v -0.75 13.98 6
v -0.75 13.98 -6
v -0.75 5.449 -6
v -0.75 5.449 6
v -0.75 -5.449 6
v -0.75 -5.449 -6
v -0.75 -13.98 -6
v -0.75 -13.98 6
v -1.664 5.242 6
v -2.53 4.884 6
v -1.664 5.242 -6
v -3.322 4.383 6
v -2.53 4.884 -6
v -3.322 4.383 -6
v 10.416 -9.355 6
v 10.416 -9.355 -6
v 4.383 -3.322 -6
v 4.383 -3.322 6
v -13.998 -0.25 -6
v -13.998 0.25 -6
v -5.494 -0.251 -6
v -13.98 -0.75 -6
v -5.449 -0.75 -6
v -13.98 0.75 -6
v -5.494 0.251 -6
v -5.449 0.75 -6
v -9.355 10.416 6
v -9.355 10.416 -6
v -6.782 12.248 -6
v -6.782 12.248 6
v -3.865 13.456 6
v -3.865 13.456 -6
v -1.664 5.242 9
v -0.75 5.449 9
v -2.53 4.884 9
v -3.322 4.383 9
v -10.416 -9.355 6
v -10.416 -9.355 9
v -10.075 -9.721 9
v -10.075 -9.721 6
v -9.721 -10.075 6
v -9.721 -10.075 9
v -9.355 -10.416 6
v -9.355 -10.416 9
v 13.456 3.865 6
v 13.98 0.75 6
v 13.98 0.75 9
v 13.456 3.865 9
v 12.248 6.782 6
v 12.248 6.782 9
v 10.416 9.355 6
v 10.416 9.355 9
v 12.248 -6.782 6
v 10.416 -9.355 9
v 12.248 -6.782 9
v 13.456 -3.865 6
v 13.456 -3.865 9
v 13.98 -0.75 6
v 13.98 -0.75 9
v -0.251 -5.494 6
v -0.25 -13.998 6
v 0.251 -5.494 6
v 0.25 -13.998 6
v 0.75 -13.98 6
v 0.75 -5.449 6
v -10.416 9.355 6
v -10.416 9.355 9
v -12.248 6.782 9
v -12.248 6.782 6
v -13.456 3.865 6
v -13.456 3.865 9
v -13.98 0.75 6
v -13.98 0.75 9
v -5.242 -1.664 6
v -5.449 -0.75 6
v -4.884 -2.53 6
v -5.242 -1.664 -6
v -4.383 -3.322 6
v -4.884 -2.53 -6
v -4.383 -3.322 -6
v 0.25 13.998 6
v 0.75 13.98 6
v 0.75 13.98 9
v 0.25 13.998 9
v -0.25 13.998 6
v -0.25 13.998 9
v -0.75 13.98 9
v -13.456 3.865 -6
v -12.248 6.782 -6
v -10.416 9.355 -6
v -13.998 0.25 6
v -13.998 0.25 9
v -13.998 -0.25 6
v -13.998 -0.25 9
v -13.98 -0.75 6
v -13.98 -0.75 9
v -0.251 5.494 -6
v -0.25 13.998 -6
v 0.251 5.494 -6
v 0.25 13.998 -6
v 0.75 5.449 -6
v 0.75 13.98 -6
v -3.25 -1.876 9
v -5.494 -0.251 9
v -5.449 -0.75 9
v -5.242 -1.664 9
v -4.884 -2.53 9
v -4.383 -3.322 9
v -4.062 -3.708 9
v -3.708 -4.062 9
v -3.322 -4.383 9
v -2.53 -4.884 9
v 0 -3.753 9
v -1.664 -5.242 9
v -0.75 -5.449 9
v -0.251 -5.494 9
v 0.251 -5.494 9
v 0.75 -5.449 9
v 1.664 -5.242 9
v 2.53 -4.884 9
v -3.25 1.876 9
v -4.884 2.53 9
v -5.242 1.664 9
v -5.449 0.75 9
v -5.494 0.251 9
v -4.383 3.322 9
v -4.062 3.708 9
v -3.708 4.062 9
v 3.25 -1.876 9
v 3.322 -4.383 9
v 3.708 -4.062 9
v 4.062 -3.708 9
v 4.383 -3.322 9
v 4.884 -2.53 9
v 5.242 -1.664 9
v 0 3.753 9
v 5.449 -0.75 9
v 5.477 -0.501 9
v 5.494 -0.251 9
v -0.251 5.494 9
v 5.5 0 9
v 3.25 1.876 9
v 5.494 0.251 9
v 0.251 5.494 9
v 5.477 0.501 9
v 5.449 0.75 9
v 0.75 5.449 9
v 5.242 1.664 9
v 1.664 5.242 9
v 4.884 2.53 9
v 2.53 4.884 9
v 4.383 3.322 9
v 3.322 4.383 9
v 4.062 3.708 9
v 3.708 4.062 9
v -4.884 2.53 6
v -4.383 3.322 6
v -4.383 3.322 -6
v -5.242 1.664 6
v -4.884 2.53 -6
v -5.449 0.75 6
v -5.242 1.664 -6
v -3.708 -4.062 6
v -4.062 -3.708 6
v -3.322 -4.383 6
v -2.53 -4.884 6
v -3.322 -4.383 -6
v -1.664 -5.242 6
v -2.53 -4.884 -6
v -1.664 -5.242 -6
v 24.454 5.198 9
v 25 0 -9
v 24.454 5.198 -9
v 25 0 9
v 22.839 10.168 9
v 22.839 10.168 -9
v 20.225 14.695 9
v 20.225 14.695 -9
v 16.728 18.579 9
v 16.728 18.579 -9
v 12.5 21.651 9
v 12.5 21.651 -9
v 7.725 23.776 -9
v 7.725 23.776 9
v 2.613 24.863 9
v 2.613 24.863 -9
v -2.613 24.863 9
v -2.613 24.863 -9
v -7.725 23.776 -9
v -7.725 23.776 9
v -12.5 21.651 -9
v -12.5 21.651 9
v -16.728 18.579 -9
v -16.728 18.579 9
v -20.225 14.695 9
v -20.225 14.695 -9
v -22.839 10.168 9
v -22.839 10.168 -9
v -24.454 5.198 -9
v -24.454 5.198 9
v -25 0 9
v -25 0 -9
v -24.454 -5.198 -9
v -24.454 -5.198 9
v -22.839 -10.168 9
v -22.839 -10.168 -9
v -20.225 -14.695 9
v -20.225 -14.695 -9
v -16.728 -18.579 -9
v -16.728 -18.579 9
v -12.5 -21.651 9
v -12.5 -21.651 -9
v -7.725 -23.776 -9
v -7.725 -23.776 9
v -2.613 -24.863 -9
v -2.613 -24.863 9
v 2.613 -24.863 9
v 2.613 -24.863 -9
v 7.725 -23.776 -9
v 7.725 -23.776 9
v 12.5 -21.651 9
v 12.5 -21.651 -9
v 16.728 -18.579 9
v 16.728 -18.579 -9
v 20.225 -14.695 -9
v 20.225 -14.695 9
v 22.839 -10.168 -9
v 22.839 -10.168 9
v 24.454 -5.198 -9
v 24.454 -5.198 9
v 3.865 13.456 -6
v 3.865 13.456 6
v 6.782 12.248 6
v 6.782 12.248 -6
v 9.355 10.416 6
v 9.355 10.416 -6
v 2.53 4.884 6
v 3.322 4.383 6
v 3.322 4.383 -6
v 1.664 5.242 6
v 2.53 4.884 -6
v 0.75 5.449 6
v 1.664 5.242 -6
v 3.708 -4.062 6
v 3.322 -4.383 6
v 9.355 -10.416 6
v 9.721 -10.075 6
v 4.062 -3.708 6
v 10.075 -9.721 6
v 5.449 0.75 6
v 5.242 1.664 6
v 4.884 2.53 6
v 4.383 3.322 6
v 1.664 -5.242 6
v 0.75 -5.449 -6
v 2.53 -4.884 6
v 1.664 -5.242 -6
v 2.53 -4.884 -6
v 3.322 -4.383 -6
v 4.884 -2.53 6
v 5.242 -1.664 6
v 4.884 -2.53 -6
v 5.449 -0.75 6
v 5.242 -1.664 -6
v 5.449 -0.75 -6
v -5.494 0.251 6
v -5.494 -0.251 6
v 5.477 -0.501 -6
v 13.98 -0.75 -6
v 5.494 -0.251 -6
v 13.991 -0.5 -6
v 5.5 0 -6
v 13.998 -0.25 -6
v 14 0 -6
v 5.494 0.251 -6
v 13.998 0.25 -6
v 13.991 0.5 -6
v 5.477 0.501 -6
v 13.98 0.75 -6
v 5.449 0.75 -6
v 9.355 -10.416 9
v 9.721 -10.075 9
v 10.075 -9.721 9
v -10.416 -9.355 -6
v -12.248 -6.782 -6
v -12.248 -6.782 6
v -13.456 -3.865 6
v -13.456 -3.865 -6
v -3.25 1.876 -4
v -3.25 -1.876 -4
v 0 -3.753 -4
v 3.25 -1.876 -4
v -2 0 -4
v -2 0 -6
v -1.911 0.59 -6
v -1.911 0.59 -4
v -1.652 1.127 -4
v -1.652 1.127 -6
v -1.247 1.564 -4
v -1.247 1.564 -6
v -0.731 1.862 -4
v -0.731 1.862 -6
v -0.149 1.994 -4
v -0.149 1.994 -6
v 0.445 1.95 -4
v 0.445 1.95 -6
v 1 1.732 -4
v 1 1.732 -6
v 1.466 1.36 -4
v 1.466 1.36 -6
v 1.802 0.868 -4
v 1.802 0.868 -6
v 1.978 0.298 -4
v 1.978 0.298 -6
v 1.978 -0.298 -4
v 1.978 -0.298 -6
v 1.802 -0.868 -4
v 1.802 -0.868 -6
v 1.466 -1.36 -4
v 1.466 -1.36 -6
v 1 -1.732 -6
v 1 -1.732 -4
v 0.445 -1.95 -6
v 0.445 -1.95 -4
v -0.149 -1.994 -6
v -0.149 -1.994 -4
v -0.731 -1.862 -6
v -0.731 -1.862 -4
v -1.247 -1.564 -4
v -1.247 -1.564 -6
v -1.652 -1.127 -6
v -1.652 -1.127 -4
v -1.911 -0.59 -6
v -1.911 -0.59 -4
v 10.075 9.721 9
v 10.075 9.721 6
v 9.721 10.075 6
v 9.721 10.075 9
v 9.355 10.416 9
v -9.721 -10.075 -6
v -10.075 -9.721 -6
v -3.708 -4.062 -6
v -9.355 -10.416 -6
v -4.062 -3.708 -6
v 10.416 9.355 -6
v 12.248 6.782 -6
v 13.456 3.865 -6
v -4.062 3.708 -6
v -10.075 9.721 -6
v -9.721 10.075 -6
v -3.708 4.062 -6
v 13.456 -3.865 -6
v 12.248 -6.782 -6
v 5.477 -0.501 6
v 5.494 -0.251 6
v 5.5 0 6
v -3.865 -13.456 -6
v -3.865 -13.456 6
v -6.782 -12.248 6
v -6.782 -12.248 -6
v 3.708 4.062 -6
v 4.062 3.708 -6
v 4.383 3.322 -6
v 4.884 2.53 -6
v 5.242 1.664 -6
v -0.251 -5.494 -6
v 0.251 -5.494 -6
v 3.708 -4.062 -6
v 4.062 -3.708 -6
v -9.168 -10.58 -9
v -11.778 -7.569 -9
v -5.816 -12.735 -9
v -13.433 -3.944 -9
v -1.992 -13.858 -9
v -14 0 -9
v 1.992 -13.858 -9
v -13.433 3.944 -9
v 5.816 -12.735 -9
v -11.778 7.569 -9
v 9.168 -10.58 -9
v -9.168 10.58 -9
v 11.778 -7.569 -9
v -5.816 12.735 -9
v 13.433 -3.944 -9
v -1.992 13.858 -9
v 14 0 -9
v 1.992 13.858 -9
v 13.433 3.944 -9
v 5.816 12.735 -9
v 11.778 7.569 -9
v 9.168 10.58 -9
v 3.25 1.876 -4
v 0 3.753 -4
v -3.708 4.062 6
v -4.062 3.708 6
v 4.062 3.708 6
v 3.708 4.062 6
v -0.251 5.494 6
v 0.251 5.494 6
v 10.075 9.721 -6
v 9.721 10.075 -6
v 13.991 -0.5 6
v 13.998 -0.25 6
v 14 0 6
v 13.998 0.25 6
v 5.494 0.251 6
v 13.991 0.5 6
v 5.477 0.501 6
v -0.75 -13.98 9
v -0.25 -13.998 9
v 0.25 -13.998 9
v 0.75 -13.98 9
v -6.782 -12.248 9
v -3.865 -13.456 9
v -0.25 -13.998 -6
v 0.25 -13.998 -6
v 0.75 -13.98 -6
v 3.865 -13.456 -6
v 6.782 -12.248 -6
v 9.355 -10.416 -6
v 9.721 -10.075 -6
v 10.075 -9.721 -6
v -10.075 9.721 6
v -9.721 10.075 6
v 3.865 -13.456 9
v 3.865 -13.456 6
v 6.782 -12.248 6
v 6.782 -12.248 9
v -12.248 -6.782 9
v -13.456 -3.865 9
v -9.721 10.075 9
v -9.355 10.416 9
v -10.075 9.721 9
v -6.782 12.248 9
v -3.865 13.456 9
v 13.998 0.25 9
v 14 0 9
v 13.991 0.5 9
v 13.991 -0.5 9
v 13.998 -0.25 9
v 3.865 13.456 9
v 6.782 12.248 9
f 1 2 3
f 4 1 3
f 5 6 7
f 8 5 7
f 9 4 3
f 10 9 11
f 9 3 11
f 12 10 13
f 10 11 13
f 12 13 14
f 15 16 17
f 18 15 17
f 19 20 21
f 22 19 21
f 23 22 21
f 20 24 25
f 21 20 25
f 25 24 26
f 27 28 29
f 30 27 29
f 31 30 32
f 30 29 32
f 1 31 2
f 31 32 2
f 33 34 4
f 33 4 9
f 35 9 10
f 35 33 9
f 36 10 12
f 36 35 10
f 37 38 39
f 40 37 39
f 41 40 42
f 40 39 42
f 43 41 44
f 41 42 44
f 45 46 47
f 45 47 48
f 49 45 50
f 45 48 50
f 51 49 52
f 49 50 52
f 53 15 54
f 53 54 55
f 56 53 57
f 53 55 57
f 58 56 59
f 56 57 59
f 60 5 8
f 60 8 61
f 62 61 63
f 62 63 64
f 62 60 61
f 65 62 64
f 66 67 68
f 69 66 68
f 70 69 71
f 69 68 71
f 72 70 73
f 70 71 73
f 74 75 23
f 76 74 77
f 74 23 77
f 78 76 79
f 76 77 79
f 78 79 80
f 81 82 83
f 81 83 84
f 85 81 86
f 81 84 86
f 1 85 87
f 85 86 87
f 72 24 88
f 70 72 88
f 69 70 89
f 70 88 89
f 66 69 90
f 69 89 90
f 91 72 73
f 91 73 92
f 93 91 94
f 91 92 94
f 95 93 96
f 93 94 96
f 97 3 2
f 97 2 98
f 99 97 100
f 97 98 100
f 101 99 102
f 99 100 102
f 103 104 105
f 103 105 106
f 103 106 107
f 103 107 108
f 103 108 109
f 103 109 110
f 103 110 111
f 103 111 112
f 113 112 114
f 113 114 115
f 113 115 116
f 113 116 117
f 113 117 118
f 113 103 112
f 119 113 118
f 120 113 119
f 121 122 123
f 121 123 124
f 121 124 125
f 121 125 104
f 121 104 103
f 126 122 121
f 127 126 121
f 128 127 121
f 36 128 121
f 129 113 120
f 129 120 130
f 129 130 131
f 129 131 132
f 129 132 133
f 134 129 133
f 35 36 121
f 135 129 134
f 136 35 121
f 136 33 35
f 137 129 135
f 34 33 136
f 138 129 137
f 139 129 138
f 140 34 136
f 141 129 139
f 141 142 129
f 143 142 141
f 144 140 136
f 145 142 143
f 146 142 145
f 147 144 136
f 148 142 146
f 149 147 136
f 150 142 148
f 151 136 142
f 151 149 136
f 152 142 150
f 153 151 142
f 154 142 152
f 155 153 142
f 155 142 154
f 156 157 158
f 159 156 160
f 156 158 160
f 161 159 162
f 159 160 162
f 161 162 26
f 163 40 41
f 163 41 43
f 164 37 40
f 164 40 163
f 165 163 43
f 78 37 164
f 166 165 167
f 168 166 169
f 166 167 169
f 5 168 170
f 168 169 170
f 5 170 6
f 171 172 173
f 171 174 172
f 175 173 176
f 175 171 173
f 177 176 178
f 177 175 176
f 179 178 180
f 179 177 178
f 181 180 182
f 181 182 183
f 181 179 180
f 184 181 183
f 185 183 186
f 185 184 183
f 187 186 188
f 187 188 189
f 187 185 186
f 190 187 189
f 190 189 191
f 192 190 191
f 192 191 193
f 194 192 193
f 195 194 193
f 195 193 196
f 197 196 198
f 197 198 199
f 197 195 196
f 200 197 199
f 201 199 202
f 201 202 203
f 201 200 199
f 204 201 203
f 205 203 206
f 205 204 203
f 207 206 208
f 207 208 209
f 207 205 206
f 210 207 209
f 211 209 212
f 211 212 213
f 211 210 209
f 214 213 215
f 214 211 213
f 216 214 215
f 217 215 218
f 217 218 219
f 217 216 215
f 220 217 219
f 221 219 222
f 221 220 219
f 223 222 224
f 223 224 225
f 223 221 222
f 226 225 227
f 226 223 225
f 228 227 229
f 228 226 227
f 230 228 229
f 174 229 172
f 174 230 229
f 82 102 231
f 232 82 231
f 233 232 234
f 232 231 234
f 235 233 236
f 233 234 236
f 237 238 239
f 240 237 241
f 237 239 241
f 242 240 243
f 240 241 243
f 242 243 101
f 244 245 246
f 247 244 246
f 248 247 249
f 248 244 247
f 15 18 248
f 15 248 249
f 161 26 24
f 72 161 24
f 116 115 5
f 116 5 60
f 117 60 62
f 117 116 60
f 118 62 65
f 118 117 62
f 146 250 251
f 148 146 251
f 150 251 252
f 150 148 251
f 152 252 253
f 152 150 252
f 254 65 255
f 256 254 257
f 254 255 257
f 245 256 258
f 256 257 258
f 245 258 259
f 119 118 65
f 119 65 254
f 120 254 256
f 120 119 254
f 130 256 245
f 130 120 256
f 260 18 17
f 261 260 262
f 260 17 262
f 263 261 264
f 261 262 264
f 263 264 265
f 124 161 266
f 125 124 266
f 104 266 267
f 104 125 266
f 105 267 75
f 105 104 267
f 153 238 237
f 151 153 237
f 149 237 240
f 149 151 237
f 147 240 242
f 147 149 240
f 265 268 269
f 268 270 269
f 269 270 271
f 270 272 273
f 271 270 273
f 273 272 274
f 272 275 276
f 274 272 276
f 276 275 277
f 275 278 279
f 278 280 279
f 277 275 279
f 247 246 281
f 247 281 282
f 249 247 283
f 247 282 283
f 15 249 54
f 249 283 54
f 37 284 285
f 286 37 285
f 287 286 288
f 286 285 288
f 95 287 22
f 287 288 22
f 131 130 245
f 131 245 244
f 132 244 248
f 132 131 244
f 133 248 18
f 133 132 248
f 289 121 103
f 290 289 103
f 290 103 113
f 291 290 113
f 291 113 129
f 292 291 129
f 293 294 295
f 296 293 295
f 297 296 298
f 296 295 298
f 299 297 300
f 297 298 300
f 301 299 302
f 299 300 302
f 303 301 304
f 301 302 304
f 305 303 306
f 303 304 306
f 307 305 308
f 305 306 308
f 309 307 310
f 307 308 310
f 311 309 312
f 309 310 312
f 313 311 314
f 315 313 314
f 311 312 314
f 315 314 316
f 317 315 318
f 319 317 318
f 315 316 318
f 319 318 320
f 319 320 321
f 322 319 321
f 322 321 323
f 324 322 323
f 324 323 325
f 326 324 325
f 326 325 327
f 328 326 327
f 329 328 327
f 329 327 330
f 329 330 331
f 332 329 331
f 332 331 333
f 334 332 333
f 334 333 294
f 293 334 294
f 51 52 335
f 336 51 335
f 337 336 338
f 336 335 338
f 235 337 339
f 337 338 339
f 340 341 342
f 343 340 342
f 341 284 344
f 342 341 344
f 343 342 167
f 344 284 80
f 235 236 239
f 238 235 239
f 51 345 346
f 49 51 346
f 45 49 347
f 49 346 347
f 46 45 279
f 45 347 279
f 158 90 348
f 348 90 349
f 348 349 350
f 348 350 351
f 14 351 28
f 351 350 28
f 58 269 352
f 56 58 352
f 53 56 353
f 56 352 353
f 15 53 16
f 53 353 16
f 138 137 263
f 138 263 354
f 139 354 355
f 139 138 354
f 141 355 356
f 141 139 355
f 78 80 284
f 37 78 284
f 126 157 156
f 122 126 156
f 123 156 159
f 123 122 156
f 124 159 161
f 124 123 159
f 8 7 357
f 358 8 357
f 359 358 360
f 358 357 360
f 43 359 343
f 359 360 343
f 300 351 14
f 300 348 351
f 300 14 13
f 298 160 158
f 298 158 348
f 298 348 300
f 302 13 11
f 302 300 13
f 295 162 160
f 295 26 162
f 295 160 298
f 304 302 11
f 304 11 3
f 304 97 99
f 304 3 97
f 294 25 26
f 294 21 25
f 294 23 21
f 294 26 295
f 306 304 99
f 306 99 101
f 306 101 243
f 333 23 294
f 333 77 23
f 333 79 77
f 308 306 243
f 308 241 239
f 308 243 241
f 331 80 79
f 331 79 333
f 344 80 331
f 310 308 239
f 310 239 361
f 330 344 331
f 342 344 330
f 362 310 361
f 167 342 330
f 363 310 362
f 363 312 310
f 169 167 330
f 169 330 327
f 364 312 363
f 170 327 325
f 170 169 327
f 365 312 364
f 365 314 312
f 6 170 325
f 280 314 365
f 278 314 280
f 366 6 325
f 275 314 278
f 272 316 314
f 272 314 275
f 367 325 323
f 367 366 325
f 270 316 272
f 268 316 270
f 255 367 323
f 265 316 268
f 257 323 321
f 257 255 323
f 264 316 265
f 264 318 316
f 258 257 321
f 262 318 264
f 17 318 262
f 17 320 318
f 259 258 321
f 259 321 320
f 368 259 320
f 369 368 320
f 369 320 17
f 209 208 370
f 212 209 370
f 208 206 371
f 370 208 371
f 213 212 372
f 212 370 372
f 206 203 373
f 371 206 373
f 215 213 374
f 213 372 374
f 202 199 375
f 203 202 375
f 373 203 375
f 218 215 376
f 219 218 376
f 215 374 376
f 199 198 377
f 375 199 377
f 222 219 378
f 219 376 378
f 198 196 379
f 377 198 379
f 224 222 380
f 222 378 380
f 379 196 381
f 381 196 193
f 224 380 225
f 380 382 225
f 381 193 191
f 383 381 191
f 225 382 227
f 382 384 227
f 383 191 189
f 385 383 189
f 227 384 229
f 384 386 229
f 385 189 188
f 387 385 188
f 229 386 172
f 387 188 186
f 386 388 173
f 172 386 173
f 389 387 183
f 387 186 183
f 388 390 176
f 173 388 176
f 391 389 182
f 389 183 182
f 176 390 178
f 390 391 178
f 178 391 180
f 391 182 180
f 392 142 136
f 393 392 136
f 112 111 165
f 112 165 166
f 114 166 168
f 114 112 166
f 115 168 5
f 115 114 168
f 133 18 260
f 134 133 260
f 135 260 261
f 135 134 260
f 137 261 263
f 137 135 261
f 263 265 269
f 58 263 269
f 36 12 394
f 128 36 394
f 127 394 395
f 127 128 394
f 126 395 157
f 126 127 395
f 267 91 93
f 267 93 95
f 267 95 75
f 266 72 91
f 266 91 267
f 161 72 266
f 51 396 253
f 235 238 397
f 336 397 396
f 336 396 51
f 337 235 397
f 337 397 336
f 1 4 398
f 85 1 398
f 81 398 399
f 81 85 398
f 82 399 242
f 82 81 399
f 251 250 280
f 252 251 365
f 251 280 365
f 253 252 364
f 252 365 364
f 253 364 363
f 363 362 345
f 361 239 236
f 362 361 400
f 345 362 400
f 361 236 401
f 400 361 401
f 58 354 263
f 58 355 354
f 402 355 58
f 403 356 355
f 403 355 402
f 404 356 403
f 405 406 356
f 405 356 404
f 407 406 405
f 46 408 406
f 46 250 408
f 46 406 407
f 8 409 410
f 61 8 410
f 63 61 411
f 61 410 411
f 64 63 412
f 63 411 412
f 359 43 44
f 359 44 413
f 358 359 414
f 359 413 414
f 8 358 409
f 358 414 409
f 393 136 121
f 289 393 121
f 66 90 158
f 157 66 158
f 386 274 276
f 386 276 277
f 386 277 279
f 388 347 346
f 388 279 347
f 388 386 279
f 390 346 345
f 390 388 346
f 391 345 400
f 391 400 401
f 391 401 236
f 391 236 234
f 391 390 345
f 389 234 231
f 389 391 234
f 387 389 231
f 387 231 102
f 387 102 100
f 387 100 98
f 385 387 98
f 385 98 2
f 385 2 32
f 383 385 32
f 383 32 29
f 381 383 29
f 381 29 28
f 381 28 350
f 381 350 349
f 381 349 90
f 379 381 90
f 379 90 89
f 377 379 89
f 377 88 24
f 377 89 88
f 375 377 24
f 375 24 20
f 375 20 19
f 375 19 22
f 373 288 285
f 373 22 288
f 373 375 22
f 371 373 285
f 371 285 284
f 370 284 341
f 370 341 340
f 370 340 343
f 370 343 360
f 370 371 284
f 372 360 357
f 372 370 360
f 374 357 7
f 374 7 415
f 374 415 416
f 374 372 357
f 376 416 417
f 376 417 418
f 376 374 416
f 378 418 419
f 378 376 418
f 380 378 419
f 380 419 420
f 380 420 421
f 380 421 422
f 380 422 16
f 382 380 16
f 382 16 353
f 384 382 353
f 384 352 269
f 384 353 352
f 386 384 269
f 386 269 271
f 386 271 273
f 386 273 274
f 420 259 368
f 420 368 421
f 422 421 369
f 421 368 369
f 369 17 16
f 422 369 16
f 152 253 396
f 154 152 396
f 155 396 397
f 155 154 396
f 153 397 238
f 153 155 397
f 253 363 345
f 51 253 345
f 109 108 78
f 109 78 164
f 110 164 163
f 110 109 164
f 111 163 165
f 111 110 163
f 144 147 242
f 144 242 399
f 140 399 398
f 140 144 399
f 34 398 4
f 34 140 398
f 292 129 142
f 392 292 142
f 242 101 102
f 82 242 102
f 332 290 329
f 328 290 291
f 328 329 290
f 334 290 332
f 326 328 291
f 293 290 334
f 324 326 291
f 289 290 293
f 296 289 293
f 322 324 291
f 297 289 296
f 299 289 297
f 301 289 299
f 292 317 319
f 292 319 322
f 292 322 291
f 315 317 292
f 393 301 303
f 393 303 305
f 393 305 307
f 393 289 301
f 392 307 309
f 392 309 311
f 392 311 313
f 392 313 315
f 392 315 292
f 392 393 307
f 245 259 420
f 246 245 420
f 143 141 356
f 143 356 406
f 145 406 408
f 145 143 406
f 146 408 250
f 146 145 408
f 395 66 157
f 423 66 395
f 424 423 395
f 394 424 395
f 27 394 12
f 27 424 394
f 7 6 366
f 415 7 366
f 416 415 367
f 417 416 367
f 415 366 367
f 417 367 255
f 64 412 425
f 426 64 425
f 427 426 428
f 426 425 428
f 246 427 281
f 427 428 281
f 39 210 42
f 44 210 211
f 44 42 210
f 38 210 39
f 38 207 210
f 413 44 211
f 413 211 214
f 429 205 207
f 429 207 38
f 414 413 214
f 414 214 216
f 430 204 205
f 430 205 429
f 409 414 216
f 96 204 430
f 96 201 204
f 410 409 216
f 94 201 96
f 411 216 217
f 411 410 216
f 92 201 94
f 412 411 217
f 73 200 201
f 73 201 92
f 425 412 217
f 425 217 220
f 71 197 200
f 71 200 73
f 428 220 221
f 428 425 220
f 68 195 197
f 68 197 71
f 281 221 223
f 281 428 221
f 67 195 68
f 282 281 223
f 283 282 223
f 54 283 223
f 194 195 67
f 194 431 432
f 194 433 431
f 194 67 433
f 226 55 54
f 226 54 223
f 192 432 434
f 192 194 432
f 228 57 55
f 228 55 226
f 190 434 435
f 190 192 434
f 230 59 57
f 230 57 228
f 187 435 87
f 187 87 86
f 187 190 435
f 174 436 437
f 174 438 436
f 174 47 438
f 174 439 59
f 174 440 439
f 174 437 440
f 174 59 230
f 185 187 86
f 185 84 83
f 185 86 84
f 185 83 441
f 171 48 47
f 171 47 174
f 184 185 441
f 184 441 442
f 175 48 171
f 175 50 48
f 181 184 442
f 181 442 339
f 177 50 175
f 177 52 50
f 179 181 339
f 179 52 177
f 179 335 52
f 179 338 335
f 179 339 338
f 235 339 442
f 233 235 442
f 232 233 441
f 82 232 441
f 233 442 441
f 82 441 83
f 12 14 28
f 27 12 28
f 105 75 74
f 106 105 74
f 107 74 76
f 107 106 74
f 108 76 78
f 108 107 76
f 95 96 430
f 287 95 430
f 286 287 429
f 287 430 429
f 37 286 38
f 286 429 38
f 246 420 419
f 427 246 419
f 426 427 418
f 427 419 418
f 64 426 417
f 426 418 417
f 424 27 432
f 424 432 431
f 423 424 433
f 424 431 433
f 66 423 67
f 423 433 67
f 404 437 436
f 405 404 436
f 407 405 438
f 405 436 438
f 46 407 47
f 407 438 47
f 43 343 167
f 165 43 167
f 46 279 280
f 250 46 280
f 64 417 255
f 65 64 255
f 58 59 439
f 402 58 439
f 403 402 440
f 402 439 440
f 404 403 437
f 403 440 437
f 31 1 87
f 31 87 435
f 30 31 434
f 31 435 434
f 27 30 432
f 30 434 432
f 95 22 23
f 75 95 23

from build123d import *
from build123d.topology import SkipClean

# Parameters (mm, degrees)
SKETCH_2_R               = 25
EXTRUDE_1_DEPTH          = 9
SKETCH_3_R               = 14
SKETCH_3_R_2             = 5.5
CUT_EXTRUDE_1_DEPTH      = 3
CUT_EXTRUDE_3_DEPTH      = 13
SKETCH_6_R               = 2
CUT_EXTRUDE_4_DEPTH      = 5
CUT_EXTRUDE_5_DEPTH      = 20
PATTERN_CIRCULAR_1_COUNT = 8
SKETCH_8_R               = 5.5
CUT_EXTRUDE_6_DEPTH      = 3


with BuildPart() as part:
    # 草图2 → 凸台-拉伸1 (new, symmetric)
    with BuildSketch(Plane.XY):
        Circle(SKETCH_2_R)
    extrude(amount=EXTRUDE_1_DEPTH, both=True)

    # 草图3 → 切除-拉伸1 (cut)
    with BuildSketch(Plane.XY.offset(9)):
        Circle(SKETCH_3_R)
        Circle(SKETCH_3_R_2, mode=Mode.SUBTRACT)
    cut_extrude_1 = extrude(amount=-CUT_EXTRUDE_1_DEPTH, mode=Mode.SUBTRACT)

    # 镜向1: 切除-拉伸1 across plane
    add(cut_extrude_1.mirror(Plane.XY), mode=Mode.SUBTRACT)

    # 草图5 → 切除-拉伸3 (cut)
    with BuildSketch(Plane.XY.offset(9)):
        Polygon((3.25, -1.876388375), (3.25, 1.876388375), (0, 3.75277675), (-3.25, 1.876388375), (-3.25, -1.876388375), (0, -3.75277675), align=None)
    extrude(amount=-CUT_EXTRUDE_3_DEPTH, mode=Mode.SUBTRACT)

    # 草图6 → 切除-拉伸4 (cut)
    with BuildSketch(Plane(origin=(0, 0, -9), x_dir=(-1, 0, 0), z_dir=(0, 0, -1))):
        Circle(SKETCH_6_R)
    extrude(amount=-CUT_EXTRUDE_4_DEPTH, mode=Mode.SUBTRACT)

    # 草图7 → 切除-拉伸5 (cut)
    with BuildSketch(Plane(origin=(0, 0, -6), x_dir=(-1, 0, 0), z_dir=(0, 0, -1))):
        with BuildLine():
            Line((0.750176034, 13.979886835), (0.750176034, 5.448599446))
            ThreePointArc((0.750176034, 5.448599446), (2.104758878, 5.081337429), (3.322287055, 4.383196177))
            Line((3.322287055, 4.383196177), (9.35481822, 10.415727342))
            ThreePointArc((9.35481822, 10.415727342), (5.357568053, 12.934313455), (0.750176034, 13.979886835))
        make_face()
    cut_extrude_5 = extrude(amount=-CUT_EXTRUDE_5_DEPTH, mode=Mode.SUBTRACT)

    # 阵列(圆周)1: 切除-拉伸5 ×8 about axis
    with SkipClean():  # the faces are left unmerged after this step: merging them gives an invalid solid
        pattern_circular_1_axis = Axis((0, 0, 0), (0, 0, 1))
        for i in range(1, PATTERN_CIRCULAR_1_COUNT):
            add(cut_extrude_5.rotate(pattern_circular_1_axis, i * 360 / PATTERN_CIRCULAR_1_COUNT), mode=Mode.SUBTRACT)

    # 草图8 → 切除-拉伸6 (cut)
    with SkipClean():  # the faces are left unmerged after this step: merging them gives an invalid solid
        with BuildSketch(Plane(origin=(0, 0, -9), x_dir=(-1, 0, 0), z_dir=(0, 0, -1))):
            with Locations(Location((0, 0, 0), (0, 0, 180))):
                Circle(SKETCH_8_R)
        extrude(amount=-CUT_EXTRUDE_6_DEPTH, mode=Mode.SUBTRACT)


solid = part.part
